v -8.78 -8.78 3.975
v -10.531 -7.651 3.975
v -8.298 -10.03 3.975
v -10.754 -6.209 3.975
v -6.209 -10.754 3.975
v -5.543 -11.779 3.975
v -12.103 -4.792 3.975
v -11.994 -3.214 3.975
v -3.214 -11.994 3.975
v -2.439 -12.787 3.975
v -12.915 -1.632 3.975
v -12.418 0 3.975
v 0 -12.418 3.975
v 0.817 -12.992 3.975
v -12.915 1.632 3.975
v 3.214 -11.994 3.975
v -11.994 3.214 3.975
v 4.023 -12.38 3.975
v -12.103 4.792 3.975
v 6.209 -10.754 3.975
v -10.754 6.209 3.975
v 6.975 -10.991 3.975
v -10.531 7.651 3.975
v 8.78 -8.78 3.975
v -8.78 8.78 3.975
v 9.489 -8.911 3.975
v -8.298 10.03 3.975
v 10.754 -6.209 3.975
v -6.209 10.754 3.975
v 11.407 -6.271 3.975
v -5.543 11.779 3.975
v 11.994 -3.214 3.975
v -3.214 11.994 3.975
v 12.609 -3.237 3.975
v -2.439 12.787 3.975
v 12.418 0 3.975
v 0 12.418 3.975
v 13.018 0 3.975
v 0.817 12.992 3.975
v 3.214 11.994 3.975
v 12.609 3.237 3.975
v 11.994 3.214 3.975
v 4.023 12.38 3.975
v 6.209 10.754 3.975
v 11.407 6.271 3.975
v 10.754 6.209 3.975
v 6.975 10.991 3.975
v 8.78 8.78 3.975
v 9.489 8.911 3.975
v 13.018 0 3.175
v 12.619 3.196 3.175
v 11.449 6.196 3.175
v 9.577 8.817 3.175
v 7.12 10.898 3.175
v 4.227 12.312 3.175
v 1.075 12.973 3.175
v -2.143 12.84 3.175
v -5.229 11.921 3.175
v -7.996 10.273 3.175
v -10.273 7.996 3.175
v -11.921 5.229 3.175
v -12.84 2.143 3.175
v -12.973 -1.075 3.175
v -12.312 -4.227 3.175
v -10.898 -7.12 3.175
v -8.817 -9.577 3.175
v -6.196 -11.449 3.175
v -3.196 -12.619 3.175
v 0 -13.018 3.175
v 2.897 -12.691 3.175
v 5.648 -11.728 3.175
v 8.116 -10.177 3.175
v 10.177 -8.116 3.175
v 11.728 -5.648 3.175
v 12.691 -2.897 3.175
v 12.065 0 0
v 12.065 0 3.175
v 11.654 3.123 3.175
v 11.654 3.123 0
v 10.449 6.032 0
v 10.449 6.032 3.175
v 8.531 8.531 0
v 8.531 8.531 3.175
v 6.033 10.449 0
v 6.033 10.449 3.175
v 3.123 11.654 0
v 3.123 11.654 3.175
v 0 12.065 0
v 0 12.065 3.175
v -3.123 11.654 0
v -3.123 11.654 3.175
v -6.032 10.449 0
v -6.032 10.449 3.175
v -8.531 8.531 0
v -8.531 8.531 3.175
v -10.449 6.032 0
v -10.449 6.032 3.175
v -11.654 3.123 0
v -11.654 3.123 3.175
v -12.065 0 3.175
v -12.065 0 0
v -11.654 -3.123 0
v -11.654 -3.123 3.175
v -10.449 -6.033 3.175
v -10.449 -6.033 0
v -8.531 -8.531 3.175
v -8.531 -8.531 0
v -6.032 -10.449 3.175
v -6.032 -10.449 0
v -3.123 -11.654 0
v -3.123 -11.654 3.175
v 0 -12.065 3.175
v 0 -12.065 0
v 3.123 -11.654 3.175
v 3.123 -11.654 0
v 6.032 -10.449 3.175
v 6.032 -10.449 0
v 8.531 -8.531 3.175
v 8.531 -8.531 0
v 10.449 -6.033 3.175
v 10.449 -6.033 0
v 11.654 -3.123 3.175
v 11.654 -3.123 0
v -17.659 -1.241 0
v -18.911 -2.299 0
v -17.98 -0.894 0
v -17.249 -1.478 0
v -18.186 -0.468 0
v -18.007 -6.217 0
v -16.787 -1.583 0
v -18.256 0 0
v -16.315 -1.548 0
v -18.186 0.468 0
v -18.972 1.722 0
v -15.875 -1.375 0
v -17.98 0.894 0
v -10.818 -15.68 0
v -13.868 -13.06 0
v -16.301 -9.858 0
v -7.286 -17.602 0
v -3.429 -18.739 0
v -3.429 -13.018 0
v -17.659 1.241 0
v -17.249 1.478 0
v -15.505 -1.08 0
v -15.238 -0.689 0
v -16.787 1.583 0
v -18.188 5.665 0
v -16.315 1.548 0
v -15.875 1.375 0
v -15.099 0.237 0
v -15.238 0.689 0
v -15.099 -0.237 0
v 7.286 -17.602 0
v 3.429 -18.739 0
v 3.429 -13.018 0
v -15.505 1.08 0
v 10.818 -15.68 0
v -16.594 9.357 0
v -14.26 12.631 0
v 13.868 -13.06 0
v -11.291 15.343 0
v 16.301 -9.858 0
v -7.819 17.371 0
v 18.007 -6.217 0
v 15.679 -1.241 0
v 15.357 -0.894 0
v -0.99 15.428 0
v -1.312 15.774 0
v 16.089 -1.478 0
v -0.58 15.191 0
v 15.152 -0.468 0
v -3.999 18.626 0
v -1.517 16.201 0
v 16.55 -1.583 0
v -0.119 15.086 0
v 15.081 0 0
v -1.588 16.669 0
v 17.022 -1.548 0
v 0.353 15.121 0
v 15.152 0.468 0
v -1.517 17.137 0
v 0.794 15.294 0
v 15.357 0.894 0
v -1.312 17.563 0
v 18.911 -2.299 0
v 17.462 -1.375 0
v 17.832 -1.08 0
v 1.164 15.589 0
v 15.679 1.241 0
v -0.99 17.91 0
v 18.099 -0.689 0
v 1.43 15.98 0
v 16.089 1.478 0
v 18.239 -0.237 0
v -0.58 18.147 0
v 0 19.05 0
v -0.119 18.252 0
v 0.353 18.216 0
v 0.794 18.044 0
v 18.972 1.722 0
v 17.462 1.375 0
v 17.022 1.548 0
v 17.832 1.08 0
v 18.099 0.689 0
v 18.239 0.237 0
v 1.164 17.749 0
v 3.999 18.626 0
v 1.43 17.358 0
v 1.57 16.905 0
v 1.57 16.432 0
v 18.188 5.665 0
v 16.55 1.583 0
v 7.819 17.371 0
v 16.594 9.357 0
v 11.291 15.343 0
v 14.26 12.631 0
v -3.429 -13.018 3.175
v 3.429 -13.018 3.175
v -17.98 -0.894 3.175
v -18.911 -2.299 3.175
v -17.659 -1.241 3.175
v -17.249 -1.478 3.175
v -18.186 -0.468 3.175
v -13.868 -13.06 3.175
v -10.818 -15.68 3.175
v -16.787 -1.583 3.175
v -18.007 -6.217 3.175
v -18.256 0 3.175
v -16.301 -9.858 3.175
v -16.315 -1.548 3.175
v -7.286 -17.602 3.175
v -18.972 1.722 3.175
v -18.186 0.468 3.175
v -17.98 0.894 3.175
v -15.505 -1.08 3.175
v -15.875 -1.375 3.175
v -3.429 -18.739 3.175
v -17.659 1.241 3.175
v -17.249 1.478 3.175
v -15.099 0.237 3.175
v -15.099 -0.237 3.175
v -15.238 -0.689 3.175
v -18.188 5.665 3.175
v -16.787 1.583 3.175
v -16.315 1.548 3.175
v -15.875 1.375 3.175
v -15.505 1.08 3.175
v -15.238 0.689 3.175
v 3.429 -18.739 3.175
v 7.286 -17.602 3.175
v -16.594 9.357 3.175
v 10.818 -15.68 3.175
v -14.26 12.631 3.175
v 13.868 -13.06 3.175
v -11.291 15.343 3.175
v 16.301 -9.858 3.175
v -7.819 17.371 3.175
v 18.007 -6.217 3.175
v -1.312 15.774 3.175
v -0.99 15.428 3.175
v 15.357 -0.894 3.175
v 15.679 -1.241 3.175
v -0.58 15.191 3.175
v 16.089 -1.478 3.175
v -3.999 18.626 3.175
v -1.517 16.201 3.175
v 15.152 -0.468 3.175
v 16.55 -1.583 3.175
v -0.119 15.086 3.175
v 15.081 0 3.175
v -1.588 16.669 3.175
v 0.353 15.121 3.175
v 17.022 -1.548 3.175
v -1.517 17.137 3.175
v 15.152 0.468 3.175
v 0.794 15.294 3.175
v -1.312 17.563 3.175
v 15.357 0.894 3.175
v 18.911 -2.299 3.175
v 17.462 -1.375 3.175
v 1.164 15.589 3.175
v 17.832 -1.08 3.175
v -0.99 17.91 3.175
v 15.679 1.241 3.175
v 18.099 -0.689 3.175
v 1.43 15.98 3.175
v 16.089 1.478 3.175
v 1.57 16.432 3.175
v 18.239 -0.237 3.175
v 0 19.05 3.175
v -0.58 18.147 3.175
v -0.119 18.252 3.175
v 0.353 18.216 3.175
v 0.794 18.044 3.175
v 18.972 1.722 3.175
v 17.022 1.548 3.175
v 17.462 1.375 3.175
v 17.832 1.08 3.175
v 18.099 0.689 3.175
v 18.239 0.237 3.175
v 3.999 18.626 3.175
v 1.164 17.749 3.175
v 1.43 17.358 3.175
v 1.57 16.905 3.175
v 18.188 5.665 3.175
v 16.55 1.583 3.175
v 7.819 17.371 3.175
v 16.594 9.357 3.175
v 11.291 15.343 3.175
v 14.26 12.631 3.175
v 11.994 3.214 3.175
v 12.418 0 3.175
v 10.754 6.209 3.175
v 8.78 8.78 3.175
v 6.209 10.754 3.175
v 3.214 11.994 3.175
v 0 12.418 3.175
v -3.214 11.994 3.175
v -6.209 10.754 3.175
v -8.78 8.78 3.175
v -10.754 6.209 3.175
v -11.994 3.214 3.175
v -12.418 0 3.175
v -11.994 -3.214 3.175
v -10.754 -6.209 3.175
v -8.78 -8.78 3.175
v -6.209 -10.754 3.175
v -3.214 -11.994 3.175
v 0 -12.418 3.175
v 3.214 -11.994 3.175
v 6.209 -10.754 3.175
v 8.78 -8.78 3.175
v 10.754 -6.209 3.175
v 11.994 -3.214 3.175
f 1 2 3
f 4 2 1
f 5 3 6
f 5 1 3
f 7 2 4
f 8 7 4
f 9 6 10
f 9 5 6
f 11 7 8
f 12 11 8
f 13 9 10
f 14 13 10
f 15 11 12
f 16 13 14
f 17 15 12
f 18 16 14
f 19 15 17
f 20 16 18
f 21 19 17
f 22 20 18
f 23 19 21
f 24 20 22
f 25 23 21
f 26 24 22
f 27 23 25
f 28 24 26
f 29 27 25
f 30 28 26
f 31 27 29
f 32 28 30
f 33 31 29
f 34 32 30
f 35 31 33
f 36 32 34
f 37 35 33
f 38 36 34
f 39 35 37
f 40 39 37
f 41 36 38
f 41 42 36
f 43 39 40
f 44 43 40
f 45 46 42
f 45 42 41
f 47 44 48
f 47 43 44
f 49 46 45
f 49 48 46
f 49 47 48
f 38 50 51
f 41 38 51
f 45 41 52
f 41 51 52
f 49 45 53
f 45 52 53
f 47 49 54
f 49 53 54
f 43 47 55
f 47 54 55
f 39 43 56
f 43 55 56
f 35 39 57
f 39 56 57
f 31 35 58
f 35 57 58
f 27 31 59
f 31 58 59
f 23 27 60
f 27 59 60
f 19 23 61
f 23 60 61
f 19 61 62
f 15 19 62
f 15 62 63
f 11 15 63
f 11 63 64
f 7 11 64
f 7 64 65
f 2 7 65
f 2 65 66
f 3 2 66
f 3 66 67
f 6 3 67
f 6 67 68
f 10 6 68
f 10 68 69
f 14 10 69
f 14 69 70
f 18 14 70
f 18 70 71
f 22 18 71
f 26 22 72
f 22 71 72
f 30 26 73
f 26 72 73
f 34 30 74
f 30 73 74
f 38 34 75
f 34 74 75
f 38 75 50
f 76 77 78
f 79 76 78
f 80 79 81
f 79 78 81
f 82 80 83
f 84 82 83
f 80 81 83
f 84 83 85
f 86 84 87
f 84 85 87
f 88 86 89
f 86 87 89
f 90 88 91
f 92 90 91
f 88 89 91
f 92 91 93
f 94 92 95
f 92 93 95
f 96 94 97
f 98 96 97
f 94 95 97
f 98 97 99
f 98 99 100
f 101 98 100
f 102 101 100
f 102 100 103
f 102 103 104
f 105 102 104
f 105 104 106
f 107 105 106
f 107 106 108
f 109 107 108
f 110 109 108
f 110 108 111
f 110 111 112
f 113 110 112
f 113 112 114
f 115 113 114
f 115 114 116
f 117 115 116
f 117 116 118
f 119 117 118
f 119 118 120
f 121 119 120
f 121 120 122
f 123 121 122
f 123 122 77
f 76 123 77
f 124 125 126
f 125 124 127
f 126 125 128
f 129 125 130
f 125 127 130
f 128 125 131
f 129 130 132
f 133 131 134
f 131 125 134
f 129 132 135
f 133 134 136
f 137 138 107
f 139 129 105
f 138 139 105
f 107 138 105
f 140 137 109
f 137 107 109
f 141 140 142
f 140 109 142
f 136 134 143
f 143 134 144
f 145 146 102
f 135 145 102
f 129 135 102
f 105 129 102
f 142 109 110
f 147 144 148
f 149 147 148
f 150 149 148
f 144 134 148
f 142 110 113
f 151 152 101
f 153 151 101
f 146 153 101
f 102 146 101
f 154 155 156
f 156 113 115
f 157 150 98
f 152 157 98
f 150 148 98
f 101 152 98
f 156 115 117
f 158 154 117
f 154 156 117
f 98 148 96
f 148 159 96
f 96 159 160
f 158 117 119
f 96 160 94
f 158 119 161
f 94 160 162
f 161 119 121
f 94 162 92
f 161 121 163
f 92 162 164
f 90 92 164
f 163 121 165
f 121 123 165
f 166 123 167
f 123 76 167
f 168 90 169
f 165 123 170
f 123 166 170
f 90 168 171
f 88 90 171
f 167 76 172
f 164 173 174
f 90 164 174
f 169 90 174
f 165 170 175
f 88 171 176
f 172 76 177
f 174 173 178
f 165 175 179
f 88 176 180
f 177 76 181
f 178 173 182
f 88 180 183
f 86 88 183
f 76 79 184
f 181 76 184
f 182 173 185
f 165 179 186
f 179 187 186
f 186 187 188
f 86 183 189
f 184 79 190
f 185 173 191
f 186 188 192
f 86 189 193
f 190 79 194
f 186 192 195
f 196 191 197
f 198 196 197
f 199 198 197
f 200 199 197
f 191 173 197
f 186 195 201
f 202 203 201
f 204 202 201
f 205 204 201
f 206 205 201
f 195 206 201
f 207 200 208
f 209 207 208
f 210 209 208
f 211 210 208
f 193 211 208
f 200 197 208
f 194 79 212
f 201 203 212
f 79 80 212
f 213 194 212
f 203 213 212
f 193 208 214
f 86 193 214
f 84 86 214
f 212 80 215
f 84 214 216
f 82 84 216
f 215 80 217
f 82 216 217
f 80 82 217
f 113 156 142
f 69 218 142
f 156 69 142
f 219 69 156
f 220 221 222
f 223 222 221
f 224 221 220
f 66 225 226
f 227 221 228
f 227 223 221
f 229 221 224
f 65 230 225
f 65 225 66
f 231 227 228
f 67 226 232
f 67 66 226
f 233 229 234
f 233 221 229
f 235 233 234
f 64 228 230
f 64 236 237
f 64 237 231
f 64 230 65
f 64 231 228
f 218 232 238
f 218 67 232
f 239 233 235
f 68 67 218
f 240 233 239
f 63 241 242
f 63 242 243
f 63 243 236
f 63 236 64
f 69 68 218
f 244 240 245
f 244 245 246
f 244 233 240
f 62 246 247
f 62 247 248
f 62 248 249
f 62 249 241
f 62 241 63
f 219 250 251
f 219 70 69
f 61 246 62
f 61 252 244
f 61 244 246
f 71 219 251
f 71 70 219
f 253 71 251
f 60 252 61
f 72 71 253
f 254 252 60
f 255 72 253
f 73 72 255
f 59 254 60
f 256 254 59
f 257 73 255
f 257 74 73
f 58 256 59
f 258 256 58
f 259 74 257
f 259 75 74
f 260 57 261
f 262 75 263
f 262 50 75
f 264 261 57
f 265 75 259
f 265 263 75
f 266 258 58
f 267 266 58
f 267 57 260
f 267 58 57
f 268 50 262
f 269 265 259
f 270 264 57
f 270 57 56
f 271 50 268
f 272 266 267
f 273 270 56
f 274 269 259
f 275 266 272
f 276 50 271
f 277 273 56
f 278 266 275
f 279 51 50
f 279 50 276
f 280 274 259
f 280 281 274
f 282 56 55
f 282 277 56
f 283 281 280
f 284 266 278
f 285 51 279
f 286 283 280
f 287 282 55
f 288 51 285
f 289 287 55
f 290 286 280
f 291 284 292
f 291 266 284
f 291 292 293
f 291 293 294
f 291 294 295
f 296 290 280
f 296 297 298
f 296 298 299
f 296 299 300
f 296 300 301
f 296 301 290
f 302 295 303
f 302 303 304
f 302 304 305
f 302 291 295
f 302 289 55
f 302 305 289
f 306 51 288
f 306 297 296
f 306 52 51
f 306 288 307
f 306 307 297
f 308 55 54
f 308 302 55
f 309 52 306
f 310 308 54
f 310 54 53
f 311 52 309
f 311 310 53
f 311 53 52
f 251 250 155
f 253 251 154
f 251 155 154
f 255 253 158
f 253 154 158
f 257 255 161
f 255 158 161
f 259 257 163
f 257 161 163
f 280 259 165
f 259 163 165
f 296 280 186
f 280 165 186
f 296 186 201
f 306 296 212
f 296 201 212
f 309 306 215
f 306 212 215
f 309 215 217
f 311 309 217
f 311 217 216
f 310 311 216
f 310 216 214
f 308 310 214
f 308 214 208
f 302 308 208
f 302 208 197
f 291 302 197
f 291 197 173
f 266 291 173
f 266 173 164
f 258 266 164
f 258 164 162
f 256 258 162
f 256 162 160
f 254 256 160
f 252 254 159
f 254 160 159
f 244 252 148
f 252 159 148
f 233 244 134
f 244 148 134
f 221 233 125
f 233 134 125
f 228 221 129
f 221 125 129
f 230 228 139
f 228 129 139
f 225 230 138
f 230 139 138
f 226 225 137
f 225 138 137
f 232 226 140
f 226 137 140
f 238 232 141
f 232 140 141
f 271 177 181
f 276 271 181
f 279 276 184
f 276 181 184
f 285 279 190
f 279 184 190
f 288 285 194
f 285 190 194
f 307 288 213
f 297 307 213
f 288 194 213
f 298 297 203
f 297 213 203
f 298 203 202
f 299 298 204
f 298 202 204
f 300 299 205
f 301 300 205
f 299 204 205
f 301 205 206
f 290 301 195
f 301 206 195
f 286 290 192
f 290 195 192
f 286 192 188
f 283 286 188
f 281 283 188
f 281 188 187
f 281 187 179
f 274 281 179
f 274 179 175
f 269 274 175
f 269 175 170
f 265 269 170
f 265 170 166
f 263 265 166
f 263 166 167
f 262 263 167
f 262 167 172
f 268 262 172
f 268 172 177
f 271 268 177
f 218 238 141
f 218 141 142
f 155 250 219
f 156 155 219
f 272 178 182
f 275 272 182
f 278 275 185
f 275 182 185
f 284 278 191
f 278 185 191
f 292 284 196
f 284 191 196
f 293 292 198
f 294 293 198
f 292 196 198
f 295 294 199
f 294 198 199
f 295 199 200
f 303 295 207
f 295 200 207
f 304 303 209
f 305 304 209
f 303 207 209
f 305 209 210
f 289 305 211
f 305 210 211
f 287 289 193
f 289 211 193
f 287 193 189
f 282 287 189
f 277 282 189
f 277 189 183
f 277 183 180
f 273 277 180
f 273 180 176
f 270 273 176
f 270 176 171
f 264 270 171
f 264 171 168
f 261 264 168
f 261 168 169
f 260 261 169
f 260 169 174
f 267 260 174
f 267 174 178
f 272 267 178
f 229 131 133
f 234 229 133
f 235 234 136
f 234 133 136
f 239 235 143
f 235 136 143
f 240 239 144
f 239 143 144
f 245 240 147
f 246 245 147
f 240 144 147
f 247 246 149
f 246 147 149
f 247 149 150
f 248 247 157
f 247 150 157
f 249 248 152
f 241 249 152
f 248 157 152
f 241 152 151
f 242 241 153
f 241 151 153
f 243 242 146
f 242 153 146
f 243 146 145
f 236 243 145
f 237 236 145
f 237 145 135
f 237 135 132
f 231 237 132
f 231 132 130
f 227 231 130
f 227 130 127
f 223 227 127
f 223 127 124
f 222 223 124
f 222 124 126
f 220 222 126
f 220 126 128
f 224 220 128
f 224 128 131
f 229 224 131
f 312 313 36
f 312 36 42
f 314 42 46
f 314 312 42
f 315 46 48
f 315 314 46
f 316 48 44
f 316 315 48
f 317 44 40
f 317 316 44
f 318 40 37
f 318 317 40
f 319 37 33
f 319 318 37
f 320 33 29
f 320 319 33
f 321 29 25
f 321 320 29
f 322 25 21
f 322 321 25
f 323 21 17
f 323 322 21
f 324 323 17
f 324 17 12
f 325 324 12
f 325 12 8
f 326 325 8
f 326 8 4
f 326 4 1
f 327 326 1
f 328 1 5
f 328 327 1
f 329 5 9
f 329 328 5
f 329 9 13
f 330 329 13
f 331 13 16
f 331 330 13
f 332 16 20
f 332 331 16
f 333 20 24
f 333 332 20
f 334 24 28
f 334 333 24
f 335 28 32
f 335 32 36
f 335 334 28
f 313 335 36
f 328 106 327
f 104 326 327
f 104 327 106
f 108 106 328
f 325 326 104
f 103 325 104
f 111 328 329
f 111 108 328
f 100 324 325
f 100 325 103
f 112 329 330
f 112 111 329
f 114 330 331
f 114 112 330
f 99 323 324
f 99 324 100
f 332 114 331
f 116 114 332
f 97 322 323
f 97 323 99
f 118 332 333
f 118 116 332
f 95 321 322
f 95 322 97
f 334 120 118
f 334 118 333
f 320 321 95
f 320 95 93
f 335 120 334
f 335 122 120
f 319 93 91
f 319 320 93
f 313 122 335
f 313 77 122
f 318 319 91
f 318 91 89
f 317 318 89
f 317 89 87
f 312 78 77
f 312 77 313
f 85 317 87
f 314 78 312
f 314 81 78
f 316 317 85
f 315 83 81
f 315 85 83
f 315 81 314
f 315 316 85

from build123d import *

# Parameters (mm, degrees)
SKETCH1_R           = 19.05
BOSS_EXTRUDE1_DEPTH = 3.175
SKETCH2_R           = 12.065
CUT_EXTRUDE1_DEPTH  = 4.175
SKETCH3_R           = 13.0175
SKETCH3_R_2         = 12.4175
BOSS_EXTRUDE2_DEPTH = 0.799999924
SKETCH4_W           = 6.858
SKETCH4_H           = 12.065
CUT_EXTRUDE2_DEPTH  = 4.175
SKETCH5_R           = 1.5875
CUT_EXTRUDE3_DEPTH  = 4.974999924


with BuildPart() as part:
    # Sketch1 → Boss-Extrude1 (new body)
    with BuildSketch(Plane.XY):
        Circle(SKETCH1_R)
    extrude(amount=BOSS_EXTRUDE1_DEPTH)

    # Sketch2 → Cut-Extrude1 (cut, through all)
    with BuildSketch(Plane.XY.offset(3.175)):
        Circle(SKETCH2_R)
    extrude(amount=-CUT_EXTRUDE1_DEPTH, mode=Mode.SUBTRACT)

    # Sketch3 → Boss-Extrude2 (add)
    with BuildSketch(Plane.XY.offset(3.175)):
        Circle(SKETCH3_R)
        Circle(SKETCH3_R_2, mode=Mode.SUBTRACT)
    extrude(amount=BOSS_EXTRUDE2_DEPTH)

    # Sketch4 → Cut-Extrude2 (cut, through all)
    with BuildSketch(Plane.XY.offset(3.175)):
        with Locations((0, -19.05)):
            Rectangle(SKETCH4_W, SKETCH4_H)
    extrude(amount=-CUT_EXTRUDE2_DEPTH, mode=Mode.SUBTRACT)

    # Sketch5 → Cut-Extrude3 (cut, through all)
    with BuildSketch(Plane(origin=(0, 0, 0), x_dir=(-1, 0, 0), z_dir=(0, 0, -1))):
        with Locations((-16.66875, 0)):
            Circle(SKETCH5_R)
        with Locations((0, 16.66875)):
            Circle(SKETCH5_R)
        with Locations((16.66875, 0)):
            Circle(SKETCH5_R)
    extrude(amount=-CUT_EXTRUDE3_DEPTH, mode=Mode.SUBTRACT)


solid = part.part
